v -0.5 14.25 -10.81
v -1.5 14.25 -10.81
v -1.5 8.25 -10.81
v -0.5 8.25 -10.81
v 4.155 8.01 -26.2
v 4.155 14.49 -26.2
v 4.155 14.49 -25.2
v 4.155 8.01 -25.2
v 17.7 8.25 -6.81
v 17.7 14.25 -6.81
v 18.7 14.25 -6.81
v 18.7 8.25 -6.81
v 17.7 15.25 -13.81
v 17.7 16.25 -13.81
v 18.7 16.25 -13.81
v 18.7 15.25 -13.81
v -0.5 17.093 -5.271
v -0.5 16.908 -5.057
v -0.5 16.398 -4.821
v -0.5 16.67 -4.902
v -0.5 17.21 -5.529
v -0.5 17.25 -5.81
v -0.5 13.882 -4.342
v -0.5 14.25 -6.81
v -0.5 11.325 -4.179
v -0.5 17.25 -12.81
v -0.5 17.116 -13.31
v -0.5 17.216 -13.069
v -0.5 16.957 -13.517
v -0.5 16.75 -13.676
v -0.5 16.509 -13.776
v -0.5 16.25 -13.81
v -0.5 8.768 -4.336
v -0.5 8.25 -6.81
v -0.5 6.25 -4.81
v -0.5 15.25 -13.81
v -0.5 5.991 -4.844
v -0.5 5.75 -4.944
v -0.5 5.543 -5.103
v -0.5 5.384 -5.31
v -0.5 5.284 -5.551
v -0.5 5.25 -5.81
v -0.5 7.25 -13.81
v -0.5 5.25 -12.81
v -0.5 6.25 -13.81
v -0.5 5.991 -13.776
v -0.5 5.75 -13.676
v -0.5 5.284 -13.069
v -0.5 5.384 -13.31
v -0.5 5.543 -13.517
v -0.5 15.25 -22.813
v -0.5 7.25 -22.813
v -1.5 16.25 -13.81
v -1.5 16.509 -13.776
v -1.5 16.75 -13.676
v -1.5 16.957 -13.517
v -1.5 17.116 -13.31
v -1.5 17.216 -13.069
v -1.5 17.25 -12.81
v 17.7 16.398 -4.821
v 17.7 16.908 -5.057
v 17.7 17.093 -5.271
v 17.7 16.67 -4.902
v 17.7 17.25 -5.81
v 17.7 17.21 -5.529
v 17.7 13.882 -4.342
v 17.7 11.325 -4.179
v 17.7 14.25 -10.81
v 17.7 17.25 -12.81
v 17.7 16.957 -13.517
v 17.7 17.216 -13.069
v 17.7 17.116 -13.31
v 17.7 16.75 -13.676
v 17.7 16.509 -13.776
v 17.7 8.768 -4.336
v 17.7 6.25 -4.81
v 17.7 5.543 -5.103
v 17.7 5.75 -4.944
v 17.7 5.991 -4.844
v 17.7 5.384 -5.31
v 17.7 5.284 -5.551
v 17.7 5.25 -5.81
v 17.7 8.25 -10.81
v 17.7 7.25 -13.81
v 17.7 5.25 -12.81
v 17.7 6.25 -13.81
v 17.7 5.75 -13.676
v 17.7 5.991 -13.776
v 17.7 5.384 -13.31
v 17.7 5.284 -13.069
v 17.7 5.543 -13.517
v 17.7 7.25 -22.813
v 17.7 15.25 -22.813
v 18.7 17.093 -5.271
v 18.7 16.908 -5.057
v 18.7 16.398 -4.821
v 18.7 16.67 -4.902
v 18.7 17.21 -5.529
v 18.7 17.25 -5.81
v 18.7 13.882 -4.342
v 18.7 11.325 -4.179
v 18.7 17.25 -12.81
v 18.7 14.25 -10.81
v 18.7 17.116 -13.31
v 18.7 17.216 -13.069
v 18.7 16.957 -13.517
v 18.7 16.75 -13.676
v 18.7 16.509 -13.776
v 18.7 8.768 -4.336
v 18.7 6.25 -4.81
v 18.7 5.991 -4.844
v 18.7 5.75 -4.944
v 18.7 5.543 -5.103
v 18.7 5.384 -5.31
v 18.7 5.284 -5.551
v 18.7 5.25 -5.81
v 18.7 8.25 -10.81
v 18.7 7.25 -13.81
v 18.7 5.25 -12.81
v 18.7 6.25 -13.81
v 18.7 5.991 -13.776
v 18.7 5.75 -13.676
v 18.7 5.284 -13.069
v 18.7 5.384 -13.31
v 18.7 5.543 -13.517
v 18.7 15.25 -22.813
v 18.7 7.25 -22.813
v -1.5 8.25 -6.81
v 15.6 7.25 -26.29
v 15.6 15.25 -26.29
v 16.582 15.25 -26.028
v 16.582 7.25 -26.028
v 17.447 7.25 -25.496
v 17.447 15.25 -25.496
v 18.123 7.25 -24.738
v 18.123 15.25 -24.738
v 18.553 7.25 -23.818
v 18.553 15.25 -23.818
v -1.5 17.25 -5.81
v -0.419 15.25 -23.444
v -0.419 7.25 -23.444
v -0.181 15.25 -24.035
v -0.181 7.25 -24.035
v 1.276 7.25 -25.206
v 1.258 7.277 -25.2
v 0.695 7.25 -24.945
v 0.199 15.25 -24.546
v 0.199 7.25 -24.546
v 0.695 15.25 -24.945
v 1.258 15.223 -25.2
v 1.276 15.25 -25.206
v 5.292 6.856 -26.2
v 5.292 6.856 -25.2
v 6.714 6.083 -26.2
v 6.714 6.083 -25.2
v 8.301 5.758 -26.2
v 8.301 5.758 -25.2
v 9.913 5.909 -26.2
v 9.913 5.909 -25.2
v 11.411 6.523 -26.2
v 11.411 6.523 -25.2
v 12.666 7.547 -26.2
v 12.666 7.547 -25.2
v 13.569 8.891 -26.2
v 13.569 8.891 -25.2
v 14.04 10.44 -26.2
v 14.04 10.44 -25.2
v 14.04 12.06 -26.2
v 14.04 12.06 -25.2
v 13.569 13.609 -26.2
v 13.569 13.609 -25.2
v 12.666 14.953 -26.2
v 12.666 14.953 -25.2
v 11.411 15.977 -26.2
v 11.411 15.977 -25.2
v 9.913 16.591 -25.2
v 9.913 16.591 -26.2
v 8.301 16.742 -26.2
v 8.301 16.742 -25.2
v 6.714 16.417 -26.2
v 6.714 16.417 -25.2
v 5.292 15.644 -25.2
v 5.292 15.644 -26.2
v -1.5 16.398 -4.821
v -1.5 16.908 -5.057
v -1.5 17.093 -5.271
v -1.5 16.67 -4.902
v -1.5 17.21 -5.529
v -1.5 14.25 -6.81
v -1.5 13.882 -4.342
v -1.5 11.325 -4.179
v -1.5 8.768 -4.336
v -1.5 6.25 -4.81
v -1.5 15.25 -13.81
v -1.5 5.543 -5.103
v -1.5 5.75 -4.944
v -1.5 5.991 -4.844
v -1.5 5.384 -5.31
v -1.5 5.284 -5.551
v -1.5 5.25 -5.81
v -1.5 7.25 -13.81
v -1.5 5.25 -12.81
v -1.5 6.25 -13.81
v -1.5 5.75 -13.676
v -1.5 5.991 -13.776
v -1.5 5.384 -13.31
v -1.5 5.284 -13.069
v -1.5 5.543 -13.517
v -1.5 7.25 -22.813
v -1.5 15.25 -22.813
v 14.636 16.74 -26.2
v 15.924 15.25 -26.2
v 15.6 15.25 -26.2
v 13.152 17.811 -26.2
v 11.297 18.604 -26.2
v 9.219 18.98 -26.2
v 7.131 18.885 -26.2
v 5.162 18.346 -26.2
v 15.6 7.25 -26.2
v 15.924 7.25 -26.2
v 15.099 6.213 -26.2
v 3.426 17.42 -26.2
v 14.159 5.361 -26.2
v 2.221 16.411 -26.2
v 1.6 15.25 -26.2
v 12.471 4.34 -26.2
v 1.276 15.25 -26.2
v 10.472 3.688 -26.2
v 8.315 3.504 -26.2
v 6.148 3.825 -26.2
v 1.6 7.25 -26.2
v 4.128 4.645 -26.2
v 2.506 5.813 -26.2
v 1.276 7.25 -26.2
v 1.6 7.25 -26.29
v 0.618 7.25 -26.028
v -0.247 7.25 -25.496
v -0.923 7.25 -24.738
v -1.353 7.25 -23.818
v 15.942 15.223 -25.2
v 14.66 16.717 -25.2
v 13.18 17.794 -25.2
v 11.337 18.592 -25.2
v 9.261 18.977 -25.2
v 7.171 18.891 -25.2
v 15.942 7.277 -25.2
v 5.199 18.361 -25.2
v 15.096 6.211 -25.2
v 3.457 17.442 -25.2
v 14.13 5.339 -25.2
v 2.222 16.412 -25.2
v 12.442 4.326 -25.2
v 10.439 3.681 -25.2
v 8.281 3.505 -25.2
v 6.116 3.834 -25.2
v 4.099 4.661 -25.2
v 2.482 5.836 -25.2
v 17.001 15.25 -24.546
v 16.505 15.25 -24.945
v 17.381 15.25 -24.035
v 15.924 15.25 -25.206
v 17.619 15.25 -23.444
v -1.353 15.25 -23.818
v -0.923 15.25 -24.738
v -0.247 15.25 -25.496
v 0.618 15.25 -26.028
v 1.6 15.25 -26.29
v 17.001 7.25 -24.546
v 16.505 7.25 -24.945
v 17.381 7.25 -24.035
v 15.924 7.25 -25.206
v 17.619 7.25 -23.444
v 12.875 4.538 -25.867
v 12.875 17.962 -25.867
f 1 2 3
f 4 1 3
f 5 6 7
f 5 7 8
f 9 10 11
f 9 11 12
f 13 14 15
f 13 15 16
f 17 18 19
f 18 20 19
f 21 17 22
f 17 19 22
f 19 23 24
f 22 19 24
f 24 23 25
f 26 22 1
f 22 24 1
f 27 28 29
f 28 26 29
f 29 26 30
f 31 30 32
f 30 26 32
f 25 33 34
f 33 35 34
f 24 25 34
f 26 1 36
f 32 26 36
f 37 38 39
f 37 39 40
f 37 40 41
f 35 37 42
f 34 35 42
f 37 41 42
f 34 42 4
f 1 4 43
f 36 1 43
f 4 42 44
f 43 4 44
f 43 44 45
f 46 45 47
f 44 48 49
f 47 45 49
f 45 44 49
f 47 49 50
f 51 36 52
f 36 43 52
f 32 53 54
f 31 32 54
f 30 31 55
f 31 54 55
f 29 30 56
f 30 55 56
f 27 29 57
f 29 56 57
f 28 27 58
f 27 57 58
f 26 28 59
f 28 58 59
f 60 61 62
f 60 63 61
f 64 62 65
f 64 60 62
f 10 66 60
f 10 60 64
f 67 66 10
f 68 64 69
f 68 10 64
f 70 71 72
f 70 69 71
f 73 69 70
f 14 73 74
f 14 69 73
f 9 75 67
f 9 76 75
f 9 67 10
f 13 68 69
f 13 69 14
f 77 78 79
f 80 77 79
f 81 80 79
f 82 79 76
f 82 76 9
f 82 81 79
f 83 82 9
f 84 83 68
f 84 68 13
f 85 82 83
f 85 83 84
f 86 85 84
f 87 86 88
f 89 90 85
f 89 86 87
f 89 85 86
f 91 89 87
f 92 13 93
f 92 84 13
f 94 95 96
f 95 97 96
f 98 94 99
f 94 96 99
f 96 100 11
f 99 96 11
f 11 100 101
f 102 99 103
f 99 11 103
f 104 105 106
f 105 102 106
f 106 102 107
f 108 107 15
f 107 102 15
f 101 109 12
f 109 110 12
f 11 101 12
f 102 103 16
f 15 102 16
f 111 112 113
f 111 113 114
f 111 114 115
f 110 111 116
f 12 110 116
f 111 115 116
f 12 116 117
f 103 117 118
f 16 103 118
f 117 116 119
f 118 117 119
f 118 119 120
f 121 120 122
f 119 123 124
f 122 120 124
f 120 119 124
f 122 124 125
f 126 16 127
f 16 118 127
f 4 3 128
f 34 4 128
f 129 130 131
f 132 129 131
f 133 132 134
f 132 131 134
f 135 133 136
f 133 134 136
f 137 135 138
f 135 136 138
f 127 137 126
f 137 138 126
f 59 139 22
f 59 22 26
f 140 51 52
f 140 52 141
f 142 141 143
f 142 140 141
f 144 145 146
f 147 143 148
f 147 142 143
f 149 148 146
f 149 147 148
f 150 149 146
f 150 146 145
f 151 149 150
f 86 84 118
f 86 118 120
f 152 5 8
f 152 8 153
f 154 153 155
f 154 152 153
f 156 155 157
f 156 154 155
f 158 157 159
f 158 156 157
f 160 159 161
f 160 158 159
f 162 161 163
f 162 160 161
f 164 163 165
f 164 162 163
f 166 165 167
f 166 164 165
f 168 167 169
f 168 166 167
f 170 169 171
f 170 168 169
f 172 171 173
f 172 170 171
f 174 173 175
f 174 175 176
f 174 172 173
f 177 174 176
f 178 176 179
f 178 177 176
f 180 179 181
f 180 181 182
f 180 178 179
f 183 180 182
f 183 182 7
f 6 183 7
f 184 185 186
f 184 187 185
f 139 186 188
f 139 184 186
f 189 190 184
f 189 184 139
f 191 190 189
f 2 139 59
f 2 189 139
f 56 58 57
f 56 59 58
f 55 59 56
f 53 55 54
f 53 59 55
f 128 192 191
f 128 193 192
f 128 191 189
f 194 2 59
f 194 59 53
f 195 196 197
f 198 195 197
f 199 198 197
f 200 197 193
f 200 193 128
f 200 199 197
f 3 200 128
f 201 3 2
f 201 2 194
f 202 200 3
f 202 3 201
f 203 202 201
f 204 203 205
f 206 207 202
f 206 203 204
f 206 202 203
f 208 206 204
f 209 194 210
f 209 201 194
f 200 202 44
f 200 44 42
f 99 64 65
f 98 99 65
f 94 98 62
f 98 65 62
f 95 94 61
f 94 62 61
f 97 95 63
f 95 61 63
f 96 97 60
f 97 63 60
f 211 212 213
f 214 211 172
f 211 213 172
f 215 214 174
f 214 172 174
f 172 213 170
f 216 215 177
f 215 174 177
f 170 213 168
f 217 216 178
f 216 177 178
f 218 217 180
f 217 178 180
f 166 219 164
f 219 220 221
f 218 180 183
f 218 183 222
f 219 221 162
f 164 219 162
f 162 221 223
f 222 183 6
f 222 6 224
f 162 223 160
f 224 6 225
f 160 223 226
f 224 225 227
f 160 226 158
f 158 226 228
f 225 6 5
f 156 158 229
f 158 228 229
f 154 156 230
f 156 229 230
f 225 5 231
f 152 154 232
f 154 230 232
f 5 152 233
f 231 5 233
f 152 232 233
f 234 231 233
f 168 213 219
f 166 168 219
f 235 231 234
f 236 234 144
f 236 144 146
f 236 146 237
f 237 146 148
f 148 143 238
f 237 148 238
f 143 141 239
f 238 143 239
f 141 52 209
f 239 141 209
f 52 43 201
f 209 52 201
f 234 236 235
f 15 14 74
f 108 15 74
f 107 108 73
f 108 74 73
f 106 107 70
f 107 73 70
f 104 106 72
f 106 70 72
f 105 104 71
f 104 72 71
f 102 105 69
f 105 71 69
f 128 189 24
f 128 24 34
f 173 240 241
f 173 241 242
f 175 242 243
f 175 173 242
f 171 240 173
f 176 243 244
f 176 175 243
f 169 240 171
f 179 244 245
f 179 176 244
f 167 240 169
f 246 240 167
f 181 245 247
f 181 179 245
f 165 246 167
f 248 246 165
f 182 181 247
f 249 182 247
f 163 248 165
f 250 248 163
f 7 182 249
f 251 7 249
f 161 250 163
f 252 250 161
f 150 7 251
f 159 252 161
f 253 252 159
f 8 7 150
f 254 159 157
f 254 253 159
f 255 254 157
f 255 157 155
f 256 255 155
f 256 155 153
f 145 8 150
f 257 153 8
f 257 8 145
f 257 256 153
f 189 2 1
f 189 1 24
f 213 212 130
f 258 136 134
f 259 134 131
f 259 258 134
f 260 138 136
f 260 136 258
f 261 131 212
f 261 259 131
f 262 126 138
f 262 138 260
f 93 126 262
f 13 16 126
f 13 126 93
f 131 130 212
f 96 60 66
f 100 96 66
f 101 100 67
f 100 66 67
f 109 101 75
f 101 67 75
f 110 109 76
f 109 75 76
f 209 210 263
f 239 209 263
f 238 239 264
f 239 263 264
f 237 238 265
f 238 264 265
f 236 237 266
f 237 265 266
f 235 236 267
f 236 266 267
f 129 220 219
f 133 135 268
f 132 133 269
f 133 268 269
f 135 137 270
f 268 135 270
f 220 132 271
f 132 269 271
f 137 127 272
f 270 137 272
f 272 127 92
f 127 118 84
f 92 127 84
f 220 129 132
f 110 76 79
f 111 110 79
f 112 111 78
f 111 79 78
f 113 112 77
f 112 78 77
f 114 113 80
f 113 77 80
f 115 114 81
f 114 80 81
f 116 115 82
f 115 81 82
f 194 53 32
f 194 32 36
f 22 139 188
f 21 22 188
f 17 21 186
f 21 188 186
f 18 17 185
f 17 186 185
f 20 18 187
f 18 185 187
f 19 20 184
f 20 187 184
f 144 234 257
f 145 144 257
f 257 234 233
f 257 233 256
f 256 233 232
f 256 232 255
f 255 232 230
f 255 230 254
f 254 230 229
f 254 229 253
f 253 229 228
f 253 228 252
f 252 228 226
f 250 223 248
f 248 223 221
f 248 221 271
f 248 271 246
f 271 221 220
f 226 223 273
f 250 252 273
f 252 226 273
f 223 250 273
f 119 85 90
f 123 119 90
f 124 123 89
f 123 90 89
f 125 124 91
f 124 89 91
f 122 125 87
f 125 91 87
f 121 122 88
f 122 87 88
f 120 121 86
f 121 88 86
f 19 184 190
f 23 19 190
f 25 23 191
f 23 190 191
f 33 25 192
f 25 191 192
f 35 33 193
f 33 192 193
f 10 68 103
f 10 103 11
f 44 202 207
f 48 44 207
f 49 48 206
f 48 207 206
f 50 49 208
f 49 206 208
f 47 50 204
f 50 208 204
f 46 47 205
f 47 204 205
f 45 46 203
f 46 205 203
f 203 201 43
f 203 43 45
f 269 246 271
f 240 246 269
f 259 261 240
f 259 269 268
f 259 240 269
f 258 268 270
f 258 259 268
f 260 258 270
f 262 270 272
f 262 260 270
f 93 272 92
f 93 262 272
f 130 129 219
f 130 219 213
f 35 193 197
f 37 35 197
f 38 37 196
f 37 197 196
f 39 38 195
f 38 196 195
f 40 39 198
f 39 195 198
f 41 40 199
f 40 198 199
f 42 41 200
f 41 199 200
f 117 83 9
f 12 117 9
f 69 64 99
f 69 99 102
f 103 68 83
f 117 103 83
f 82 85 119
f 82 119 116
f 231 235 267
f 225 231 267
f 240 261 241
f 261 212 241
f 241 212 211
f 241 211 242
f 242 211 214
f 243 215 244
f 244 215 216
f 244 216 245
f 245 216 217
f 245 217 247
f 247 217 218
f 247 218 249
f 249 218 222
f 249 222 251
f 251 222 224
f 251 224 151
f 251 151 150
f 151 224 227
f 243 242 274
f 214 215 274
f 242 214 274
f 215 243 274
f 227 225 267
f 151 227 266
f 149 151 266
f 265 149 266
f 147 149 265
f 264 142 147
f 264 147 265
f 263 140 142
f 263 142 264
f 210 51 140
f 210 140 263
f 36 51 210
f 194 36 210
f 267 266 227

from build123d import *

# Parameters (mm, degrees)
BOX021_W            = 10
BOX021_H            = 20
BOX021_DEPTH        = 10
BOX022_W            = 10
BOX022_H            = 20
BOX022_DEPTH        = 10
PAD007_DEPTH        = 1
BOX023_W            = 14
BOX023_H            = 20
BOX023_DEPTH        = 10
SKETCH007_W         = 4
SKETCH007_H         = 6
PAD006_DEPTH        = 1
CLONE008_ROLL_ANGLE = 90
CLONE009_ROLL_ANGLE = 90
PAD005_DEPTH        = 8
CLONE007_ROLL_ANGLE = 90


with BuildPart() as cubo021:
    # Box021 → Box021 (new body)
    with BuildSketch(Plane(origin=(7.4, -10, -16), x_dir=(1, 0, 0), z_dir=(0, 0, 1))):
        with Locations((5, 10)):
            Rectangle(BOX021_W, BOX021_H)
    extrude(amount=BOX021_DEPTH)


with BuildPart() as cubo022:
    # Box022 → Box022 (new body)
    with BuildSketch(Plane(origin=(-17.4, -10, -16), x_dir=(1, 0, 0), z_dir=(0, 0, 1))):
        with Locations((5, 10)):
            Rectangle(BOX022_W, BOX022_H)
    extrude(amount=BOX022_DEPTH)


with BuildPart() as cut034:
    # Sketch008 → Pad007 (new body)
    with BuildSketch(Plane(origin=(0, 0, -12.6), x_dir=(-1, 0, 0), z_dir=(0, 0, 1))):
        with BuildLine():
            add(Edge.make_bspline(
                [(8.550522, 0), (8.550522, 13.423394), (-4.275261, 6.711697), (-17.101044, 0), (-4.275261, -6.711697), (8.550522, -13.423394), (8.550522, 0)],
                knots=[0, 0, 0, 2.094395, 2.094395, 4.18879, 4.18879, 6.283185, 6.283185, 6.283185], degree=2, weights=[1, 0.5, 1, 0.5, 1, 0.5, 1]))
        make_face()
        with BuildLine():
            ThreePointArc((4.444579, 3.239709), (-5.5, 0), (4.444579, -3.239709))
            Line((4.444579, -3.239709), (4.444579, 3.239709))
        make_face(mode=Mode.SUBTRACT)
    extrude(amount=PAD007_DEPTH)

    # Cut033: cut Cubo022
    add(cubo022.part, mode=Mode.SUBTRACT)

    # Cut034: cut Cubo021
    add(cubo021.part, mode=Mode.SUBTRACT)


with BuildPart() as cubo023:
    # Box023 → Box023 (new body)
    with BuildSketch(Plane(origin=(-7, -10, -16), x_dir=(1, 0, 0), z_dir=(0, 0, 1))):
        with Locations((7, 10)):
            Rectangle(BOX023_W, BOX023_H)
    extrude(amount=BOX023_DEPTH)


with BuildPart() as enganche:
    # Sketch007 → Pad006 (new body)
    with BuildSketch(Plane.YZ):
        with BuildLine():
            Line((-3.5, 6), (3.5, 6))
            ThreePointArc((4.5, 5), (4.207107, 5.707107), (3.5, 6))
            ThreePointArc((4.488917, -5.148471), (5.130693, -0.074931), (4.5, 5))
            ThreePointArc((3.5, -6), (4.152506, -5.757783), (4.488917, -5.148471))
            Line((3.5, -6), (-3.5, -6))
            ThreePointArc((-4.5, -5), (-4.207107, -5.707107), (-3.5, -6))
            Line((-4.5, -5), (-4.5, 5))
            ThreePointArc((-3.5, 6), (-4.207107, 5.707107), (-4.5, 5))
        make_face()
        with Locations((0.5, 0)):
            Rectangle(SKETCH007_W, SKETCH007_H, mode=Mode.SUBTRACT)
    extrude(amount=PAD006_DEPTH)


with BuildPart() as clone_of_enganche:
    # Clone008 base: copy of Enganche
    add(enganche.part)


with BuildPart() as clone_of_enganche_1:
    # Clone008 roll: moved
    add(clone_of_enganche.part.rotate(Axis((0, 0, 0), (1, 0, 0)), CLONE008_ROLL_ANGLE))


with BuildPart() as clone_of_enganche_2:
    # Clone008 placement: moved
    add(clone_of_enganche_1.part.moved(Location((-10.1, 0, 4.29))))


with BuildPart() as clone_of_enganche001:
    # Clone009 base: copy of Enganche
    add(enganche.part)


with BuildPart() as clone_of_enganche001_1:
    # Clone009 roll: moved
    add(clone_of_enganche001.part.rotate(Axis((0, 0, 0), (1, 0, 0)), CLONE009_ROLL_ANGLE))


with BuildPart() as clone_of_enganche001_2:
    # Clone009 placement: moved
    add(clone_of_enganche001_1.part.moved(Location((9.1, 0, 4.29))))


with BuildPart() as brida:
    # Sketch006 → Pad005 (new body)
    with BuildSketch(Plane.XY):
        with BuildLine():
            Line((-10.1, 0.787419), (-9.1, 0.787419))
            Line((-9.1, 0.787419), (-9.1, -9.212581))
            ThreePointArc((-9.1, -9.212581), (-8.367767, -10.980348), (-6.6, -11.712581))
            Line((-6.6, -11.712581), (6.6, -11.712581))
            ThreePointArc((6.6, -11.712581), (8.367767, -10.980348), (9.1, -9.212581))
            Line((9.1, -9.212581), (9.1, 0.787419))
            Line((9.1, 0.787419), (10.1, 0.787419))
            Line((10.1, 0.787419), (10.1, -9.212581))
            ThreePointArc((6.6, -12.712581), (9.074874, -11.687455), (10.1, -9.212581))
            Line((6.6, -12.712581), (-6.6, -12.712581))
            ThreePointArc((-10.1, -9.212581), (-9.074874, -11.687455), (-6.6, -12.712581))
            Line((-10.1, -9.212581), (-10.1, 0.787419))
        make_face()
    extrude(amount=PAD005_DEPTH)


with BuildPart() as brida_1:
    # Clone007 roll: moved
    add(brida.part.rotate(Axis((0, 0, 0), (1, 0, 0)), CLONE007_ROLL_ANGLE))


with BuildPart() as brida_2:
    # Clone007 placement: moved
    add(brida_1.part.moved(Location((0, 4, 0))))

    # Fusion014: union Clone of Enganche, Clone of Enganche001
    add(clone_of_enganche_2.part)
    add(clone_of_enganche001_2.part)

    # Cut032: cut Cubo023
    add(cubo023.part, mode=Mode.SUBTRACT)

    # Fusion015: union Cut034
    add(cut034.part)


with BuildPart() as brida_3:
    # Fusion015 placement: moved
    add(brida_2.part.moved(Location((8.6, 11.25, -13.6))))


solid = brida_3.part
